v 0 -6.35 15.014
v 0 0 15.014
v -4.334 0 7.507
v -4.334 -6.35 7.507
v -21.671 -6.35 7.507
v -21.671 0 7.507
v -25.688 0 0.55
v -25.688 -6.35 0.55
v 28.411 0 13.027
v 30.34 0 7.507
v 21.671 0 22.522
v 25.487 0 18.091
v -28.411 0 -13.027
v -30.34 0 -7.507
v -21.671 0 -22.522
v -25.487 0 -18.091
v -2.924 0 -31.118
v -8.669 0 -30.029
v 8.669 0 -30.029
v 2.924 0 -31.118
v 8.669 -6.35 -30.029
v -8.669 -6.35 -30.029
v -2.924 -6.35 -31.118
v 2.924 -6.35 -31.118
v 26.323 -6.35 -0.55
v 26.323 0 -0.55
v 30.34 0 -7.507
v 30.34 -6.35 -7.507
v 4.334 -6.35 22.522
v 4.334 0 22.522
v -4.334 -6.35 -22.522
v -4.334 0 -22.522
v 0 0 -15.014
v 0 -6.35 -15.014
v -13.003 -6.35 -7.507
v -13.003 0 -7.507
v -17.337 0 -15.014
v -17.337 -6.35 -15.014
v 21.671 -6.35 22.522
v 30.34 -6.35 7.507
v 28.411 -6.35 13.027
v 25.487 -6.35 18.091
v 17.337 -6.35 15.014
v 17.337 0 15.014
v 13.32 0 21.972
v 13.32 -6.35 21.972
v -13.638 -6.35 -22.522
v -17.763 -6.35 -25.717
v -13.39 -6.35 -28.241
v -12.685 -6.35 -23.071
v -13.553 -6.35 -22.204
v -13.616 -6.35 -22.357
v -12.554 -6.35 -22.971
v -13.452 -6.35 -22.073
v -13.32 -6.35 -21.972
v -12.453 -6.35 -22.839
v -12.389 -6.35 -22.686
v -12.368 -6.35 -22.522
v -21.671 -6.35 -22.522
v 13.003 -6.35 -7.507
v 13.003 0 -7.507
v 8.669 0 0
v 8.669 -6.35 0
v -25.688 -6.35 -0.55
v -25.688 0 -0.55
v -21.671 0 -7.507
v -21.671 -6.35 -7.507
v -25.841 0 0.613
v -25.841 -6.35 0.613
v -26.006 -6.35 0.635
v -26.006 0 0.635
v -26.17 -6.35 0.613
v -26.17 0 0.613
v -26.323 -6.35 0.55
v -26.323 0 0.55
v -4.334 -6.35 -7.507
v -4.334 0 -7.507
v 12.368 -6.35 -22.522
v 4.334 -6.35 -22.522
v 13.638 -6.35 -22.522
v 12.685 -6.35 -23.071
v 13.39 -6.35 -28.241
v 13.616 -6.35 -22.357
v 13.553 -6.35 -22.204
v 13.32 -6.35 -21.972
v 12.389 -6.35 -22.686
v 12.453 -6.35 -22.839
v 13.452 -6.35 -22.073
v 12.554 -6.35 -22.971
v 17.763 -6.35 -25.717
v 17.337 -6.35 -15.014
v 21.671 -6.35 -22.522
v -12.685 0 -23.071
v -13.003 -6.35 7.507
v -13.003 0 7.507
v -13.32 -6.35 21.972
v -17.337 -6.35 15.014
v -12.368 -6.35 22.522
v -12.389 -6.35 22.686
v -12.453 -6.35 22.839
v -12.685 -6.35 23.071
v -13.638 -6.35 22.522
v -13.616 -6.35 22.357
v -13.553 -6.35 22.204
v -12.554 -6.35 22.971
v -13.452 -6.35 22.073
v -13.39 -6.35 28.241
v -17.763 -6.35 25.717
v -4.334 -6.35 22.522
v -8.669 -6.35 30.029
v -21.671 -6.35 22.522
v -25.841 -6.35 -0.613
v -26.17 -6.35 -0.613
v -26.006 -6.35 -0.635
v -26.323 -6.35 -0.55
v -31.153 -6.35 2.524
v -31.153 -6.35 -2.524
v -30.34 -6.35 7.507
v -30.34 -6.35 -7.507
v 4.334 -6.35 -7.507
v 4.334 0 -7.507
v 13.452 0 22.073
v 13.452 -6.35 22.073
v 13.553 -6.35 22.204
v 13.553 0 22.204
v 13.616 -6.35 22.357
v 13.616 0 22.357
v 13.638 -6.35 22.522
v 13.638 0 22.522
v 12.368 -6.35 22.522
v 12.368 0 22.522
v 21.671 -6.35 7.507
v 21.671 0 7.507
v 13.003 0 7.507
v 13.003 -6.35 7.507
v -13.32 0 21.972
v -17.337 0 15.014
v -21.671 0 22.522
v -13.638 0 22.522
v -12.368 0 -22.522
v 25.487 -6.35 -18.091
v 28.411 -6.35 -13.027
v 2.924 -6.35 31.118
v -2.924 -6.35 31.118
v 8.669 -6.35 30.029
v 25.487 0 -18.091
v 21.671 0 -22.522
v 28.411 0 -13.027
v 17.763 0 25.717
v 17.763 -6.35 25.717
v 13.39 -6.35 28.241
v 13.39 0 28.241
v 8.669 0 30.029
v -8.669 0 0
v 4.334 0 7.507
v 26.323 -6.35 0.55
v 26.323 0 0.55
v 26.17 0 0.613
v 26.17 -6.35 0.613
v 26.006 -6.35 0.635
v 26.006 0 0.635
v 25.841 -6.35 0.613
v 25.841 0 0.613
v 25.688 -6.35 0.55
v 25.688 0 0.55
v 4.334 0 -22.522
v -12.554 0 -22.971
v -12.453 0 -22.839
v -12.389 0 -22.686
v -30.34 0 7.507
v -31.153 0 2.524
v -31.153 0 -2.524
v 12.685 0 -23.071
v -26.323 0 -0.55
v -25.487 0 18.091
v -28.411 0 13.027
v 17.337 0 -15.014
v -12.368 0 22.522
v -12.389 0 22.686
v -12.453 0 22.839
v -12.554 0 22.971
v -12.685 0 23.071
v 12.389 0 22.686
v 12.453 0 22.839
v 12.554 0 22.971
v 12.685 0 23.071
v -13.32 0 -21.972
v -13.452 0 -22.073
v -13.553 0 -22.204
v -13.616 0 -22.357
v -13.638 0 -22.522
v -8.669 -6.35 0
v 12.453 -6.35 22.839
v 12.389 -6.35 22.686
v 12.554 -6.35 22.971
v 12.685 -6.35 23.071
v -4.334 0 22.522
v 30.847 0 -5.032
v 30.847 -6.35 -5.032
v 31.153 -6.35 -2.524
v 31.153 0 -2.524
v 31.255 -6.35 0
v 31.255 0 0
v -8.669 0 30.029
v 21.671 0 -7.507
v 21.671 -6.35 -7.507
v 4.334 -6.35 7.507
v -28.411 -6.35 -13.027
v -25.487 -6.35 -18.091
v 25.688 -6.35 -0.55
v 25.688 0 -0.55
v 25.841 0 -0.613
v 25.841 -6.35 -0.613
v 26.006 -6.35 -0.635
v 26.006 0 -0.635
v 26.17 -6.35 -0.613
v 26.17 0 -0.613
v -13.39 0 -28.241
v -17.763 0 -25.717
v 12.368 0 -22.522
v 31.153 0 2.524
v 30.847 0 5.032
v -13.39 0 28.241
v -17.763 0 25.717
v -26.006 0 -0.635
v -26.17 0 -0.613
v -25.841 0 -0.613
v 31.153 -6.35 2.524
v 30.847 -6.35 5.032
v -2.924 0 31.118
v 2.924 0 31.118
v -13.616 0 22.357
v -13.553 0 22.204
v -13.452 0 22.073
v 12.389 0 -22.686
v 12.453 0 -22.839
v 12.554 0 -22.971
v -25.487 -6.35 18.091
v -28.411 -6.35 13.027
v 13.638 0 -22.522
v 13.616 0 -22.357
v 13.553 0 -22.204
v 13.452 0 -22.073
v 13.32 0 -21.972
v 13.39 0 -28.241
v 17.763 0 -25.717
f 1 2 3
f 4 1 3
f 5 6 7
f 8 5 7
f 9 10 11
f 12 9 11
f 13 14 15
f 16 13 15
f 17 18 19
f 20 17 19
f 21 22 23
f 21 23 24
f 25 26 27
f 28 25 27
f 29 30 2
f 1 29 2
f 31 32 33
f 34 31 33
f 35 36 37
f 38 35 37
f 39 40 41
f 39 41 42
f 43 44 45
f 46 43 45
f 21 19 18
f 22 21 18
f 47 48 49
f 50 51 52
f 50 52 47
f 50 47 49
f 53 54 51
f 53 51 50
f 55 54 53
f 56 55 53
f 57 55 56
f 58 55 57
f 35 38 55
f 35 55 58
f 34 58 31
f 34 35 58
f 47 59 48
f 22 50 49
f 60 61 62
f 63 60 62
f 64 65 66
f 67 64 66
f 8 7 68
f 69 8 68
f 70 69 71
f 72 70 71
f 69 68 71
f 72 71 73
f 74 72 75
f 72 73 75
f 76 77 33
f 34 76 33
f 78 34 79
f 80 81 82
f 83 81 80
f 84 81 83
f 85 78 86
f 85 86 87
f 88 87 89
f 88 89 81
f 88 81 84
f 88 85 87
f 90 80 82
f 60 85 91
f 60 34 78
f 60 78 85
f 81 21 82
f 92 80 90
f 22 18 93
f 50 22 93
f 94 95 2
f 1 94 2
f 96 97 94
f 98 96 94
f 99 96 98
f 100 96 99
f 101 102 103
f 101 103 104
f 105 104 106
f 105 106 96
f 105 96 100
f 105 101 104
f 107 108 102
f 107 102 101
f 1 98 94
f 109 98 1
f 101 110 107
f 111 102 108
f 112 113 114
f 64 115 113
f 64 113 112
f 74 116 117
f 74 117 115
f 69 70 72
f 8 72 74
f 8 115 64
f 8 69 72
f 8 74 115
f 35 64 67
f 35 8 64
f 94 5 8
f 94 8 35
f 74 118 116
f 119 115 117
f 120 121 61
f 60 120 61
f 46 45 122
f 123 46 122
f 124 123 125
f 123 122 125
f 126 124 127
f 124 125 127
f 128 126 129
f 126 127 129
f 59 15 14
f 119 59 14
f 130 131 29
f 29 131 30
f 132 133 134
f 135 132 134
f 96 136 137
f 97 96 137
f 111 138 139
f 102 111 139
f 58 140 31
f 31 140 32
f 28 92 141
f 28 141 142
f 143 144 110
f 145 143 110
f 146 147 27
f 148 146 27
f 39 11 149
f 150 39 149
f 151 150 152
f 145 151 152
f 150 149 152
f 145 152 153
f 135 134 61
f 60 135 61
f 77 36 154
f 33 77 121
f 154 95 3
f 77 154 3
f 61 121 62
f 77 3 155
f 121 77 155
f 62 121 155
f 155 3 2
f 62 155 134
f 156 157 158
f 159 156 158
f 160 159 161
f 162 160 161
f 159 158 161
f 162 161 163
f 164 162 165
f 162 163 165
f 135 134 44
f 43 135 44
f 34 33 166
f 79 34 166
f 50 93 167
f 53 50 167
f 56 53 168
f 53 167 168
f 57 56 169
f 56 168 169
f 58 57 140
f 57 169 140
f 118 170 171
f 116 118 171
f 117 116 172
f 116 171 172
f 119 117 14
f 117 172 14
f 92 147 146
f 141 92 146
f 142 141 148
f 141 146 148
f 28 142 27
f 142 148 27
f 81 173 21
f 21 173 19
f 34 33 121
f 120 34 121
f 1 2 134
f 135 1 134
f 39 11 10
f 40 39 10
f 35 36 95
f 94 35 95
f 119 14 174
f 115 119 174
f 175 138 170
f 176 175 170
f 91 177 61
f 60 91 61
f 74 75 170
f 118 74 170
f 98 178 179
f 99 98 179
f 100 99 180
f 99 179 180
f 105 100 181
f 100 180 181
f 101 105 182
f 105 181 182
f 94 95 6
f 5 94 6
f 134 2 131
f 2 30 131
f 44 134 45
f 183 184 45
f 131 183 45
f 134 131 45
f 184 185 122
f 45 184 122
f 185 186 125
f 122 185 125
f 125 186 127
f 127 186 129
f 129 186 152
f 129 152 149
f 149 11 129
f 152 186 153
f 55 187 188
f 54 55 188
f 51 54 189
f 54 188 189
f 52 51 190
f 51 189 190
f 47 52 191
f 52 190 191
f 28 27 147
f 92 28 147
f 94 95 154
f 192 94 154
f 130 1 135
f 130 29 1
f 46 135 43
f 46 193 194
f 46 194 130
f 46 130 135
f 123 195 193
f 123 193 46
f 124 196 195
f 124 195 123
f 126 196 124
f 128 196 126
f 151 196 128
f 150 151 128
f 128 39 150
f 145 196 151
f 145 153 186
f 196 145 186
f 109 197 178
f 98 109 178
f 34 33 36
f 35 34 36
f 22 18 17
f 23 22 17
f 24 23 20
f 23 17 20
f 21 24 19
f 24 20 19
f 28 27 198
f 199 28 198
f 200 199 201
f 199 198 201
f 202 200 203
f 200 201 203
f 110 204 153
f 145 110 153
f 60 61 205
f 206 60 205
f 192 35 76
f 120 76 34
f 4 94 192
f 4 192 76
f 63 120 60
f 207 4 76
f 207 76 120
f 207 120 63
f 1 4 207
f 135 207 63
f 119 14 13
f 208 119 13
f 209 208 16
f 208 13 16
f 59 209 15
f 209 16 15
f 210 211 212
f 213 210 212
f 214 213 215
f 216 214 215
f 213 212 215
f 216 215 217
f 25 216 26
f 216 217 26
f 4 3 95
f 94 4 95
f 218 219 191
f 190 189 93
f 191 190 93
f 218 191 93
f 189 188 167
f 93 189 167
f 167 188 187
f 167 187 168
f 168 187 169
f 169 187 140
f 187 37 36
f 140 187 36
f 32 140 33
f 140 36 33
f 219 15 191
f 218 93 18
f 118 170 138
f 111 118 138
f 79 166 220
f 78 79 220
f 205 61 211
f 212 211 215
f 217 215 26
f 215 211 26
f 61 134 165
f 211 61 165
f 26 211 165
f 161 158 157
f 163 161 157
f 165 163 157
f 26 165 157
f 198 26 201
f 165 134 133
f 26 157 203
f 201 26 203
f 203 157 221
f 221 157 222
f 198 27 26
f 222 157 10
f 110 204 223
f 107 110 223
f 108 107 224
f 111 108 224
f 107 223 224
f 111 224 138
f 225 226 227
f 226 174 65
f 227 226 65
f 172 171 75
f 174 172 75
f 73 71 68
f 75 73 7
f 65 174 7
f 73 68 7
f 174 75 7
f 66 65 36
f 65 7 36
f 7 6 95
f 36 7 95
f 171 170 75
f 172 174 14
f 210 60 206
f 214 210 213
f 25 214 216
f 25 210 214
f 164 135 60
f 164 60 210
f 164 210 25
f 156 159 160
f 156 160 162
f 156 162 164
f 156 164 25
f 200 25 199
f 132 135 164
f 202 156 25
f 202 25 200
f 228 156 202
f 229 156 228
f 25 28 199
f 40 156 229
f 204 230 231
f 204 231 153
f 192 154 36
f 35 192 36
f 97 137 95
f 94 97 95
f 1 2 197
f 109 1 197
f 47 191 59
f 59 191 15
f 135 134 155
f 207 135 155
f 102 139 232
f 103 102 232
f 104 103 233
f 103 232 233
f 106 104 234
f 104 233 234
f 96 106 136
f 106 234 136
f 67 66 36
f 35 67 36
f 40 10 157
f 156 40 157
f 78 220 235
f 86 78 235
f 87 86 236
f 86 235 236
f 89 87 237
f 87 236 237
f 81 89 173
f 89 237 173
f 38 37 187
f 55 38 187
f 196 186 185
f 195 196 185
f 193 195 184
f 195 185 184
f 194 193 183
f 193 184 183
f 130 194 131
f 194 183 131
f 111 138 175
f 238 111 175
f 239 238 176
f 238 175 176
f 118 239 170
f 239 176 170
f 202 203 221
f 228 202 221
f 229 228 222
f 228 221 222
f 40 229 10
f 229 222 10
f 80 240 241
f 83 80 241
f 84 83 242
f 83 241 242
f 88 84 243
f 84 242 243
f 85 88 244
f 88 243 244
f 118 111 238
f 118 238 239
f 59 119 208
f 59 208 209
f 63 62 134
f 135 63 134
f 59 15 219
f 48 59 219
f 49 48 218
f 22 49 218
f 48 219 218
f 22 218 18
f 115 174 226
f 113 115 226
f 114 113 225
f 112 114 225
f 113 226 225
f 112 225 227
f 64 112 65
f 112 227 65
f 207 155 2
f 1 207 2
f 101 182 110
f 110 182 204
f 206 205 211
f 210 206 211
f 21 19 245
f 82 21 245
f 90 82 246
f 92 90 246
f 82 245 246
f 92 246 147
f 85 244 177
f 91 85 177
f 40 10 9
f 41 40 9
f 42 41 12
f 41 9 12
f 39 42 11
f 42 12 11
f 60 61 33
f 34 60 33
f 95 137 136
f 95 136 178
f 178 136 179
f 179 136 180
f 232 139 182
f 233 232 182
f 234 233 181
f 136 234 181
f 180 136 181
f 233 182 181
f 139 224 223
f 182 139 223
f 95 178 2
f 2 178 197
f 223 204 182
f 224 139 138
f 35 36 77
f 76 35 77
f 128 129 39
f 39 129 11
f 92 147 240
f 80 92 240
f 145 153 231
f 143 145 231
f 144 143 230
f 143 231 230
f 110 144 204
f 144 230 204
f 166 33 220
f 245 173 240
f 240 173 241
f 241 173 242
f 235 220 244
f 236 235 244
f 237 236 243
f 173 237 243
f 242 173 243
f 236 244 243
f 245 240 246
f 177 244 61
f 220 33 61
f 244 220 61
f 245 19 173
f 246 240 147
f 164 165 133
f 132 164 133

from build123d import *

# Parameters (mm, degrees)
F1_DEPTH = 6.35


# Not quite as in the source:
# - a feature names something its author has since deleted; it is built from what else it names


with BuildPart() as f1:
    # F0 (on Front) → F1 (new body)
    with BuildSketch(Plane.XZ):
        with BuildLine():
            Line((21.6713532185, 7.5071769686), (13.0028119311, 7.5071769686))
            Line((13.0028119311, 7.5071769686), (13.0028119311, -7.5071769686))
            Line((13.0028119311, -7.5071769686), (21.6713532185, -7.5071769686))
            Line((21.6713532185, -7.5071769686), (25.6881238621, -0.5499261314))
            ThreePointArc((25.6881238621, -0.5499261314), (25.3706238621, 0), (25.6881238621, 0.5499261314))
            Line((25.6881238621, 0.5499261314), (21.6713532185, 7.5071769686))
        make_face()
        with BuildLine():
            ThreePointArc((26.3231238621, 0.5499261314), (26.0056238621, 0.635), (25.6881238621, 0.5499261314))
            ThreePointArc((25.6881238621, 0.5499261314), (25.3706238621, 0), (25.6881238621, -0.5499261314))
            ThreePointArc((25.6881238621, -0.5499261314), (26.0056238621, -0.635), (26.3231238621, -0.5499261314))
            ThreePointArc((26.3231238621, -0.5499261314), (26.5555499936, -0.3175), (26.6406238621, 0))
            ThreePointArc((26.6406238621, 0), (26.5555499936, 0.3175), (26.3231238621, 0.5499261314))
        make_face()
        with BuildLine():
            Line((30.3398945058, 7.5071769686), (26.3231238621, 0.5499261314))
            ThreePointArc((26.3231238621, 0.5499261314), (26.5555499936, 0.3175), (26.6406238621, 0))
            ThreePointArc((26.6406238621, 0), (26.5555499936, -0.3175), (26.3231238621, -0.5499261314))
            Line((26.3231238621, -0.5499261314), (30.3398945058, -7.5071769686))
            ThreePointArc((30.3398945058, -7.5071769686), (31.0252829652, -3.7813650434), (31.2548700951, 0))
            ThreePointArc((31.2548700951, 0), (31.0252829652, 3.7813650434), (30.3398945058, 7.5071769686))
        make_face()
    extrude(amount=F1_DEPTH)


with BuildPart() as f1b:
    # F0 (on Front) → F1, piece 2 (new body)
    with BuildSketch(Plane.XZ):
        with BuildLine():
            Line((0, 15.0143539373), (13.0028119311, 7.5071769686))
            Line((13.0028119311, 7.5071769686), (17.3370825748, 15.0143539373))
            Line((17.3370825748, 15.0143539373), (13.3203119311, 21.9716047745))
            ThreePointArc((13.3203119311, 21.9716047745), (12.6853119311, 21.9716047745), (12.3678119311, 22.5215309059))
            Line((12.3678119311, 22.5215309059), (4.3342706437, 22.5215309059))
            Line((4.3342706437, 22.5215309059), (0, 15.0143539373))
        make_face()
        with BuildLine():
            ThreePointArc((12.3678119311, 22.5215309059), (12.6853119311, 21.9716047745), (13.3203119311, 21.9716047745))
            ThreePointArc((13.3203119311, 21.9716047745), (13.5527380625, 22.2040309059), (13.6378119311, 22.5215309059))
            ThreePointArc((13.6378119311, 22.5215309059), (13.3203119311, 23.0714570373), (12.6853119311, 23.0714570373))
            ThreePointArc((12.6853119311, 23.0714570373), (12.4528857997, 22.8390309059), (12.3678119311, 22.5215309059))
        make_face()
        with BuildLine():
            ThreePointArc((12.6853119311, 23.0714570373), (13.3203119311, 23.0714570373), (13.6378119311, 22.5215309059))
            Line((13.6378119311, 22.5215309059), (21.6713532185, 22.5215309059))
            ThreePointArc((21.6713532185, 22.5215309059), (15.6274350476, 27.0675114944), (8.6685412874, 30.0287078745))
            Line((8.6685412874, 30.0287078745), (12.6853119311, 23.0714570373))
        make_face()
    extrude(amount=F1_DEPTH)


with BuildPart() as f1c:
    # F0 (on Front) → F1, piece 3 (new body)
    with BuildSketch(Plane.XZ):
        Polygon((8.6685412874, 0), (13.0028119311, 7.5071769686), (4.3342706437, 7.5071769686), (0, 0), align=None)
        Polygon((4.3342706437, -7.5071769686), (13.0028119311, -7.5071769686), (8.6685412874, 0), (0, 0), align=None)
        Polygon((4.3342706437, 7.5071769686), (0, 15.0143539373), (-4.3342706437, 7.5071769686), (0, 0), align=None)
        Polygon((-4.3342706437, -7.5071769686), (0, -15.0143539373), (4.3342706437, -7.5071769686), (0, 0), align=None)
        Polygon((-4.3342706437, 7.5071769686), (-13.0028119311, 7.5071769686), (-8.6685412874, 0), (0, 0), align=None)
        Polygon((-4.3342706437, -7.5071769686), (0, 0), (-8.6685412874, 0), (-13.0028119311, -7.5071769686), align=None)
    extrude(amount=F1_DEPTH)


with BuildPart() as f1d:
    # F0 (on Front) → F1, piece 4 (new body)
    with BuildSketch(Plane.XZ):
        with BuildLine():
            Line((17.3370825748, -15.0143539373), (13.0028119311, -7.5071769686))
            Line((13.0028119311, -7.5071769686), (0, -15.0143539373))
            Line((0, -15.0143539373), (4.3342706437, -22.5215309059))
            Line((4.3342706437, -22.5215309059), (12.3678119311, -22.5215309059))
            ThreePointArc((12.3678119311, -22.5215309059), (12.6853119311, -21.9716047745), (13.3203119311, -21.9716047745))
            Line((13.3203119311, -21.9716047745), (17.3370825748, -15.0143539373))
        make_face()
        with BuildLine():
            ThreePointArc((13.6378119311, -22.5215309059), (13.5527380625, -22.2040309059), (13.3203119311, -21.9716047745))
            ThreePointArc((13.3203119311, -21.9716047745), (12.6853119311, -21.9716047745), (12.3678119311, -22.5215309059))
            ThreePointArc((12.3678119311, -22.5215309059), (12.4528857997, -22.8390309059), (12.6853119311, -23.0714570373))
            ThreePointArc((12.6853119311, -23.0714570373), (13.3203119311, -23.0714570373), (13.6378119311, -22.5215309059))
        make_face()
        with BuildLine():
            Line((21.6713532185, -22.5215309059), (13.6378119311, -22.5215309059))
            ThreePointArc((13.6378119311, -22.5215309059), (13.3203119311, -23.0714570373), (12.6853119311, -23.0714570373))
            Line((12.6853119311, -23.0714570373), (8.6685412874, -30.0287078745))
            ThreePointArc((8.6685412874, -30.0287078745), (15.6274350476, -27.0675114944), (21.6713532185, -22.5215309059))
        make_face()
    extrude(amount=F1_DEPTH)


with BuildPart() as f1e:
    # F0 (on Front) → F1, piece 5 (new body)
    with BuildSketch(Plane.XZ):
        with BuildLine():
            Line((-13.0028119311, 7.5071769686), (0, 15.0143539373))
            Line((0, 15.0143539373), (-4.3342706437, 22.5215309059))
            Line((-4.3342706437, 22.5215309059), (-12.3678119311, 22.5215309059))
            ThreePointArc((-12.3678119311, 22.5215309059), (-12.6853119311, 21.9716047745), (-13.3203119311, 21.9716047745))
            Line((-13.3203119311, 21.9716047745), (-17.3370825748, 15.0143539373))
            Line((-17.3370825748, 15.0143539373), (-13.0028119311, 7.5071769686))
        make_face()
        with BuildLine():
            ThreePointArc((-13.3203119311, 21.9716047745), (-12.6853119311, 21.9716047745), (-12.3678119311, 22.5215309059))
            ThreePointArc((-12.3678119311, 22.5215309059), (-12.4528857997, 22.8390309059), (-12.6853119311, 23.0714570373))
            ThreePointArc((-12.6853119311, 23.0714570373), (-13.3203119311, 23.0714570373), (-13.6378119311, 22.5215309059))
            ThreePointArc((-13.6378119311, 22.5215309059), (-13.5527380625, 22.2040309059), (-13.3203119311, 21.9716047745))
        make_face()
        with BuildLine():
            ThreePointArc((-13.6378119311, 22.5215309059), (-13.3203119311, 23.0714570373), (-12.6853119311, 23.0714570373))
            Line((-12.6853119311, 23.0714570373), (-8.6685412874, 30.0287078745))
            ThreePointArc((-8.6685412874, 30.0287078745), (-15.6274350476, 27.0675114944), (-21.6713532185, 22.5215309059))
            Line((-21.6713532185, 22.5215309059), (-13.6378119311, 22.5215309059))
        make_face()
    extrude(amount=F1_DEPTH)


with BuildPart() as f1f:
    # F0 (on Front) → F1, piece 6 (new body)
    with BuildSketch(Plane.XZ):
        with BuildLine():
            Line((-4.3342706437, -22.5215309059), (0, -15.0143539373))
            Line((0, -15.0143539373), (-13.0028119311, -7.5071769686))
            Line((-13.0028119311, -7.5071769686), (-17.3370825748, -15.0143539373))
            Line((-17.3370825748, -15.0143539373), (-13.3203119311, -21.9716047745))
            ThreePointArc((-13.3203119311, -21.9716047745), (-12.6853119311, -21.9716047745), (-12.3678119311, -22.5215309059))
            Line((-12.3678119311, -22.5215309059), (-4.3342706437, -22.5215309059))
        make_face()
        with BuildLine():
            ThreePointArc((-12.6853119311, -23.0714570373), (-12.4528857997, -22.8390309059), (-12.3678119311, -22.5215309059))
            ThreePointArc((-12.3678119311, -22.5215309059), (-12.6853119311, -21.9716047745), (-13.3203119311, -21.9716047745))
            ThreePointArc((-13.3203119311, -21.9716047745), (-13.5527380625, -22.2040309059), (-13.6378119311, -22.5215309059))
            ThreePointArc((-13.6378119311, -22.5215309059), (-13.3203119311, -23.0714570373), (-12.6853119311, -23.0714570373))
        make_face()
        with BuildLine():
            Line((-8.6685412874, -30.0287078745), (-12.6853119311, -23.0714570373))
            ThreePointArc((-12.6853119311, -23.0714570373), (-13.3203119311, -23.0714570373), (-13.6378119311, -22.5215309059))
            Line((-13.6378119311, -22.5215309059), (-21.6713532185, -22.5215309059))
            ThreePointArc((-21.6713532185, -22.5215309059), (-15.6274350476, -27.0675114944), (-8.6685412874, -30.0287078745))
        make_face()
    extrude(amount=F1_DEPTH)


with BuildPart() as f1g:
    # F0 (on Front) → F1, piece 7 (new body)
    with BuildSketch(Plane.XZ):
        with BuildLine():
            Line((-13.0028119311, -7.5071769686), (-13.0028119311, 7.5071769686))
            Line((-13.0028119311, 7.5071769686), (-21.6713532185, 7.5071769686))
            Line((-21.6713532185, 7.5071769686), (-25.6881238621, 0.5499261314))
            ThreePointArc((-25.6881238621, 0.5499261314), (-25.4556977307, 0.3175), (-25.3706238621, 0))
            ThreePointArc((-25.3706238621, 0), (-25.4556977307, -0.3175), (-25.6881238621, -0.5499261314))
            Line((-25.6881238621, -0.5499261314), (-21.6713532185, -7.5071769686))
            Line((-21.6713532185, -7.5071769686), (-13.0028119311, -7.5071769686))
        make_face()
        with BuildLine():
            ThreePointArc((-25.3706238621, 0), (-25.4556977307, 0.3175), (-25.6881238621, 0.5499261314))
            ThreePointArc((-25.6881238621, 0.5499261314), (-26.0056238621, 0.635), (-26.3231238621, 0.5499261314))
            ThreePointArc((-26.3231238621, 0.5499261314), (-26.6406238621, 0), (-26.3231238621, -0.5499261314))
            ThreePointArc((-26.3231238621, -0.5499261314), (-26.0056238621, -0.635), (-25.6881238621, -0.5499261314))
            ThreePointArc((-25.6881238621, -0.5499261314), (-25.4556977307, -0.3175), (-25.3706238621, 0))
        make_face()
        with BuildLine():
            ThreePointArc((-26.3231238621, -0.5499261314), (-26.6406238621, 0), (-26.3231238621, 0.5499261314))
            Line((-26.3231238621, 0.5499261314), (-30.3398945058, 7.5071769686))
            ThreePointArc((-30.3398945058, 7.5071769686), (-31.2548700951, 0), (-30.3398945058, -7.5071769686))
            Line((-30.3398945058, -7.5071769686), (-26.3231238621, -0.5499261314))
        make_face()
    extrude(amount=F1_DEPTH)


with BuildPart() as f1h:
    # F0 (on Front) → F1, piece 8 (new body)
    with BuildSketch(Plane.XZ):
        with BuildLine():
            ThreePointArc((30.3398945058, 7.5071769686), (27.0675114944, 15.6274350476), (21.6713532185, 22.5215309059))
            Line((21.6713532185, 22.5215309059), (30.3398945058, 7.5071769686))
        make_face()
    extrude(amount=F1_DEPTH)


with BuildPart() as f1i:
    # F0 (on Front) → F1, piece 9 (new body)
    with BuildSketch(Plane.XZ):
        with BuildLine():
            Line((30.3398945058, -7.5071769686), (21.6713532185, -22.5215309059))
            ThreePointArc((21.6713532185, -22.5215309059), (27.0675114944, -15.6274350476), (30.3398945058, -7.5071769686))
        make_face()
    extrude(amount=F1_DEPTH)


with BuildPart() as f1j:
    # F0 (on Front) → F1, piece 10 (new body)
    with BuildSketch(Plane.XZ):
        with BuildLine():
            ThreePointArc((8.6685412874, 30.0287078745), (0, 31.2548700951), (-8.6685412874, 30.0287078745))
            Line((-8.6685412874, 30.0287078745), (8.6685412874, 30.0287078745))
        make_face()
    extrude(amount=F1_DEPTH)


with BuildPart() as f1k:
    # F0 (on Front) → F1, piece 11 (new body)
    with BuildSketch(Plane.XZ):
        with BuildLine():
            ThreePointArc((-8.6685412874, -30.0287078745), (0, -31.2548700951), (8.6685412874, -30.0287078745))
            Line((8.6685412874, -30.0287078745), (-8.6685412874, -30.0287078745))
        make_face()
    extrude(amount=F1_DEPTH)


with BuildPart() as f1l:
    # F0 (on Front) → F1, piece 12 (new body)
    with BuildSketch(Plane.XZ):
        with BuildLine():
            Line((-30.3398945058, 7.5071769686), (-21.6713532185, 22.5215309059))
            ThreePointArc((-21.6713532185, 22.5215309059), (-27.0675114944, 15.6274350476), (-30.3398945058, 7.5071769686))
        make_face()
    extrude(amount=F1_DEPTH)


with BuildPart() as f1m:
    # F0 (on Front) → F1, piece 13 (new body)
    with BuildSketch(Plane.XZ):
        with BuildLine():
            ThreePointArc((-30.3398945058, -7.5071769686), (-27.0675114944, -15.6274350476), (-21.6713532185, -22.5215309059))
            Line((-21.6713532185, -22.5215309059), (-30.3398945058, -7.5071769686))
        make_face()
    extrude(amount=F1_DEPTH)


solid = Compound([f1.part, f1b.part, f1c.part, f1d.part, f1e.part, f1f.part, f1g.part, f1h.part, f1i.part, f1j.part, f1k.part, f1l.part, f1m.part])
